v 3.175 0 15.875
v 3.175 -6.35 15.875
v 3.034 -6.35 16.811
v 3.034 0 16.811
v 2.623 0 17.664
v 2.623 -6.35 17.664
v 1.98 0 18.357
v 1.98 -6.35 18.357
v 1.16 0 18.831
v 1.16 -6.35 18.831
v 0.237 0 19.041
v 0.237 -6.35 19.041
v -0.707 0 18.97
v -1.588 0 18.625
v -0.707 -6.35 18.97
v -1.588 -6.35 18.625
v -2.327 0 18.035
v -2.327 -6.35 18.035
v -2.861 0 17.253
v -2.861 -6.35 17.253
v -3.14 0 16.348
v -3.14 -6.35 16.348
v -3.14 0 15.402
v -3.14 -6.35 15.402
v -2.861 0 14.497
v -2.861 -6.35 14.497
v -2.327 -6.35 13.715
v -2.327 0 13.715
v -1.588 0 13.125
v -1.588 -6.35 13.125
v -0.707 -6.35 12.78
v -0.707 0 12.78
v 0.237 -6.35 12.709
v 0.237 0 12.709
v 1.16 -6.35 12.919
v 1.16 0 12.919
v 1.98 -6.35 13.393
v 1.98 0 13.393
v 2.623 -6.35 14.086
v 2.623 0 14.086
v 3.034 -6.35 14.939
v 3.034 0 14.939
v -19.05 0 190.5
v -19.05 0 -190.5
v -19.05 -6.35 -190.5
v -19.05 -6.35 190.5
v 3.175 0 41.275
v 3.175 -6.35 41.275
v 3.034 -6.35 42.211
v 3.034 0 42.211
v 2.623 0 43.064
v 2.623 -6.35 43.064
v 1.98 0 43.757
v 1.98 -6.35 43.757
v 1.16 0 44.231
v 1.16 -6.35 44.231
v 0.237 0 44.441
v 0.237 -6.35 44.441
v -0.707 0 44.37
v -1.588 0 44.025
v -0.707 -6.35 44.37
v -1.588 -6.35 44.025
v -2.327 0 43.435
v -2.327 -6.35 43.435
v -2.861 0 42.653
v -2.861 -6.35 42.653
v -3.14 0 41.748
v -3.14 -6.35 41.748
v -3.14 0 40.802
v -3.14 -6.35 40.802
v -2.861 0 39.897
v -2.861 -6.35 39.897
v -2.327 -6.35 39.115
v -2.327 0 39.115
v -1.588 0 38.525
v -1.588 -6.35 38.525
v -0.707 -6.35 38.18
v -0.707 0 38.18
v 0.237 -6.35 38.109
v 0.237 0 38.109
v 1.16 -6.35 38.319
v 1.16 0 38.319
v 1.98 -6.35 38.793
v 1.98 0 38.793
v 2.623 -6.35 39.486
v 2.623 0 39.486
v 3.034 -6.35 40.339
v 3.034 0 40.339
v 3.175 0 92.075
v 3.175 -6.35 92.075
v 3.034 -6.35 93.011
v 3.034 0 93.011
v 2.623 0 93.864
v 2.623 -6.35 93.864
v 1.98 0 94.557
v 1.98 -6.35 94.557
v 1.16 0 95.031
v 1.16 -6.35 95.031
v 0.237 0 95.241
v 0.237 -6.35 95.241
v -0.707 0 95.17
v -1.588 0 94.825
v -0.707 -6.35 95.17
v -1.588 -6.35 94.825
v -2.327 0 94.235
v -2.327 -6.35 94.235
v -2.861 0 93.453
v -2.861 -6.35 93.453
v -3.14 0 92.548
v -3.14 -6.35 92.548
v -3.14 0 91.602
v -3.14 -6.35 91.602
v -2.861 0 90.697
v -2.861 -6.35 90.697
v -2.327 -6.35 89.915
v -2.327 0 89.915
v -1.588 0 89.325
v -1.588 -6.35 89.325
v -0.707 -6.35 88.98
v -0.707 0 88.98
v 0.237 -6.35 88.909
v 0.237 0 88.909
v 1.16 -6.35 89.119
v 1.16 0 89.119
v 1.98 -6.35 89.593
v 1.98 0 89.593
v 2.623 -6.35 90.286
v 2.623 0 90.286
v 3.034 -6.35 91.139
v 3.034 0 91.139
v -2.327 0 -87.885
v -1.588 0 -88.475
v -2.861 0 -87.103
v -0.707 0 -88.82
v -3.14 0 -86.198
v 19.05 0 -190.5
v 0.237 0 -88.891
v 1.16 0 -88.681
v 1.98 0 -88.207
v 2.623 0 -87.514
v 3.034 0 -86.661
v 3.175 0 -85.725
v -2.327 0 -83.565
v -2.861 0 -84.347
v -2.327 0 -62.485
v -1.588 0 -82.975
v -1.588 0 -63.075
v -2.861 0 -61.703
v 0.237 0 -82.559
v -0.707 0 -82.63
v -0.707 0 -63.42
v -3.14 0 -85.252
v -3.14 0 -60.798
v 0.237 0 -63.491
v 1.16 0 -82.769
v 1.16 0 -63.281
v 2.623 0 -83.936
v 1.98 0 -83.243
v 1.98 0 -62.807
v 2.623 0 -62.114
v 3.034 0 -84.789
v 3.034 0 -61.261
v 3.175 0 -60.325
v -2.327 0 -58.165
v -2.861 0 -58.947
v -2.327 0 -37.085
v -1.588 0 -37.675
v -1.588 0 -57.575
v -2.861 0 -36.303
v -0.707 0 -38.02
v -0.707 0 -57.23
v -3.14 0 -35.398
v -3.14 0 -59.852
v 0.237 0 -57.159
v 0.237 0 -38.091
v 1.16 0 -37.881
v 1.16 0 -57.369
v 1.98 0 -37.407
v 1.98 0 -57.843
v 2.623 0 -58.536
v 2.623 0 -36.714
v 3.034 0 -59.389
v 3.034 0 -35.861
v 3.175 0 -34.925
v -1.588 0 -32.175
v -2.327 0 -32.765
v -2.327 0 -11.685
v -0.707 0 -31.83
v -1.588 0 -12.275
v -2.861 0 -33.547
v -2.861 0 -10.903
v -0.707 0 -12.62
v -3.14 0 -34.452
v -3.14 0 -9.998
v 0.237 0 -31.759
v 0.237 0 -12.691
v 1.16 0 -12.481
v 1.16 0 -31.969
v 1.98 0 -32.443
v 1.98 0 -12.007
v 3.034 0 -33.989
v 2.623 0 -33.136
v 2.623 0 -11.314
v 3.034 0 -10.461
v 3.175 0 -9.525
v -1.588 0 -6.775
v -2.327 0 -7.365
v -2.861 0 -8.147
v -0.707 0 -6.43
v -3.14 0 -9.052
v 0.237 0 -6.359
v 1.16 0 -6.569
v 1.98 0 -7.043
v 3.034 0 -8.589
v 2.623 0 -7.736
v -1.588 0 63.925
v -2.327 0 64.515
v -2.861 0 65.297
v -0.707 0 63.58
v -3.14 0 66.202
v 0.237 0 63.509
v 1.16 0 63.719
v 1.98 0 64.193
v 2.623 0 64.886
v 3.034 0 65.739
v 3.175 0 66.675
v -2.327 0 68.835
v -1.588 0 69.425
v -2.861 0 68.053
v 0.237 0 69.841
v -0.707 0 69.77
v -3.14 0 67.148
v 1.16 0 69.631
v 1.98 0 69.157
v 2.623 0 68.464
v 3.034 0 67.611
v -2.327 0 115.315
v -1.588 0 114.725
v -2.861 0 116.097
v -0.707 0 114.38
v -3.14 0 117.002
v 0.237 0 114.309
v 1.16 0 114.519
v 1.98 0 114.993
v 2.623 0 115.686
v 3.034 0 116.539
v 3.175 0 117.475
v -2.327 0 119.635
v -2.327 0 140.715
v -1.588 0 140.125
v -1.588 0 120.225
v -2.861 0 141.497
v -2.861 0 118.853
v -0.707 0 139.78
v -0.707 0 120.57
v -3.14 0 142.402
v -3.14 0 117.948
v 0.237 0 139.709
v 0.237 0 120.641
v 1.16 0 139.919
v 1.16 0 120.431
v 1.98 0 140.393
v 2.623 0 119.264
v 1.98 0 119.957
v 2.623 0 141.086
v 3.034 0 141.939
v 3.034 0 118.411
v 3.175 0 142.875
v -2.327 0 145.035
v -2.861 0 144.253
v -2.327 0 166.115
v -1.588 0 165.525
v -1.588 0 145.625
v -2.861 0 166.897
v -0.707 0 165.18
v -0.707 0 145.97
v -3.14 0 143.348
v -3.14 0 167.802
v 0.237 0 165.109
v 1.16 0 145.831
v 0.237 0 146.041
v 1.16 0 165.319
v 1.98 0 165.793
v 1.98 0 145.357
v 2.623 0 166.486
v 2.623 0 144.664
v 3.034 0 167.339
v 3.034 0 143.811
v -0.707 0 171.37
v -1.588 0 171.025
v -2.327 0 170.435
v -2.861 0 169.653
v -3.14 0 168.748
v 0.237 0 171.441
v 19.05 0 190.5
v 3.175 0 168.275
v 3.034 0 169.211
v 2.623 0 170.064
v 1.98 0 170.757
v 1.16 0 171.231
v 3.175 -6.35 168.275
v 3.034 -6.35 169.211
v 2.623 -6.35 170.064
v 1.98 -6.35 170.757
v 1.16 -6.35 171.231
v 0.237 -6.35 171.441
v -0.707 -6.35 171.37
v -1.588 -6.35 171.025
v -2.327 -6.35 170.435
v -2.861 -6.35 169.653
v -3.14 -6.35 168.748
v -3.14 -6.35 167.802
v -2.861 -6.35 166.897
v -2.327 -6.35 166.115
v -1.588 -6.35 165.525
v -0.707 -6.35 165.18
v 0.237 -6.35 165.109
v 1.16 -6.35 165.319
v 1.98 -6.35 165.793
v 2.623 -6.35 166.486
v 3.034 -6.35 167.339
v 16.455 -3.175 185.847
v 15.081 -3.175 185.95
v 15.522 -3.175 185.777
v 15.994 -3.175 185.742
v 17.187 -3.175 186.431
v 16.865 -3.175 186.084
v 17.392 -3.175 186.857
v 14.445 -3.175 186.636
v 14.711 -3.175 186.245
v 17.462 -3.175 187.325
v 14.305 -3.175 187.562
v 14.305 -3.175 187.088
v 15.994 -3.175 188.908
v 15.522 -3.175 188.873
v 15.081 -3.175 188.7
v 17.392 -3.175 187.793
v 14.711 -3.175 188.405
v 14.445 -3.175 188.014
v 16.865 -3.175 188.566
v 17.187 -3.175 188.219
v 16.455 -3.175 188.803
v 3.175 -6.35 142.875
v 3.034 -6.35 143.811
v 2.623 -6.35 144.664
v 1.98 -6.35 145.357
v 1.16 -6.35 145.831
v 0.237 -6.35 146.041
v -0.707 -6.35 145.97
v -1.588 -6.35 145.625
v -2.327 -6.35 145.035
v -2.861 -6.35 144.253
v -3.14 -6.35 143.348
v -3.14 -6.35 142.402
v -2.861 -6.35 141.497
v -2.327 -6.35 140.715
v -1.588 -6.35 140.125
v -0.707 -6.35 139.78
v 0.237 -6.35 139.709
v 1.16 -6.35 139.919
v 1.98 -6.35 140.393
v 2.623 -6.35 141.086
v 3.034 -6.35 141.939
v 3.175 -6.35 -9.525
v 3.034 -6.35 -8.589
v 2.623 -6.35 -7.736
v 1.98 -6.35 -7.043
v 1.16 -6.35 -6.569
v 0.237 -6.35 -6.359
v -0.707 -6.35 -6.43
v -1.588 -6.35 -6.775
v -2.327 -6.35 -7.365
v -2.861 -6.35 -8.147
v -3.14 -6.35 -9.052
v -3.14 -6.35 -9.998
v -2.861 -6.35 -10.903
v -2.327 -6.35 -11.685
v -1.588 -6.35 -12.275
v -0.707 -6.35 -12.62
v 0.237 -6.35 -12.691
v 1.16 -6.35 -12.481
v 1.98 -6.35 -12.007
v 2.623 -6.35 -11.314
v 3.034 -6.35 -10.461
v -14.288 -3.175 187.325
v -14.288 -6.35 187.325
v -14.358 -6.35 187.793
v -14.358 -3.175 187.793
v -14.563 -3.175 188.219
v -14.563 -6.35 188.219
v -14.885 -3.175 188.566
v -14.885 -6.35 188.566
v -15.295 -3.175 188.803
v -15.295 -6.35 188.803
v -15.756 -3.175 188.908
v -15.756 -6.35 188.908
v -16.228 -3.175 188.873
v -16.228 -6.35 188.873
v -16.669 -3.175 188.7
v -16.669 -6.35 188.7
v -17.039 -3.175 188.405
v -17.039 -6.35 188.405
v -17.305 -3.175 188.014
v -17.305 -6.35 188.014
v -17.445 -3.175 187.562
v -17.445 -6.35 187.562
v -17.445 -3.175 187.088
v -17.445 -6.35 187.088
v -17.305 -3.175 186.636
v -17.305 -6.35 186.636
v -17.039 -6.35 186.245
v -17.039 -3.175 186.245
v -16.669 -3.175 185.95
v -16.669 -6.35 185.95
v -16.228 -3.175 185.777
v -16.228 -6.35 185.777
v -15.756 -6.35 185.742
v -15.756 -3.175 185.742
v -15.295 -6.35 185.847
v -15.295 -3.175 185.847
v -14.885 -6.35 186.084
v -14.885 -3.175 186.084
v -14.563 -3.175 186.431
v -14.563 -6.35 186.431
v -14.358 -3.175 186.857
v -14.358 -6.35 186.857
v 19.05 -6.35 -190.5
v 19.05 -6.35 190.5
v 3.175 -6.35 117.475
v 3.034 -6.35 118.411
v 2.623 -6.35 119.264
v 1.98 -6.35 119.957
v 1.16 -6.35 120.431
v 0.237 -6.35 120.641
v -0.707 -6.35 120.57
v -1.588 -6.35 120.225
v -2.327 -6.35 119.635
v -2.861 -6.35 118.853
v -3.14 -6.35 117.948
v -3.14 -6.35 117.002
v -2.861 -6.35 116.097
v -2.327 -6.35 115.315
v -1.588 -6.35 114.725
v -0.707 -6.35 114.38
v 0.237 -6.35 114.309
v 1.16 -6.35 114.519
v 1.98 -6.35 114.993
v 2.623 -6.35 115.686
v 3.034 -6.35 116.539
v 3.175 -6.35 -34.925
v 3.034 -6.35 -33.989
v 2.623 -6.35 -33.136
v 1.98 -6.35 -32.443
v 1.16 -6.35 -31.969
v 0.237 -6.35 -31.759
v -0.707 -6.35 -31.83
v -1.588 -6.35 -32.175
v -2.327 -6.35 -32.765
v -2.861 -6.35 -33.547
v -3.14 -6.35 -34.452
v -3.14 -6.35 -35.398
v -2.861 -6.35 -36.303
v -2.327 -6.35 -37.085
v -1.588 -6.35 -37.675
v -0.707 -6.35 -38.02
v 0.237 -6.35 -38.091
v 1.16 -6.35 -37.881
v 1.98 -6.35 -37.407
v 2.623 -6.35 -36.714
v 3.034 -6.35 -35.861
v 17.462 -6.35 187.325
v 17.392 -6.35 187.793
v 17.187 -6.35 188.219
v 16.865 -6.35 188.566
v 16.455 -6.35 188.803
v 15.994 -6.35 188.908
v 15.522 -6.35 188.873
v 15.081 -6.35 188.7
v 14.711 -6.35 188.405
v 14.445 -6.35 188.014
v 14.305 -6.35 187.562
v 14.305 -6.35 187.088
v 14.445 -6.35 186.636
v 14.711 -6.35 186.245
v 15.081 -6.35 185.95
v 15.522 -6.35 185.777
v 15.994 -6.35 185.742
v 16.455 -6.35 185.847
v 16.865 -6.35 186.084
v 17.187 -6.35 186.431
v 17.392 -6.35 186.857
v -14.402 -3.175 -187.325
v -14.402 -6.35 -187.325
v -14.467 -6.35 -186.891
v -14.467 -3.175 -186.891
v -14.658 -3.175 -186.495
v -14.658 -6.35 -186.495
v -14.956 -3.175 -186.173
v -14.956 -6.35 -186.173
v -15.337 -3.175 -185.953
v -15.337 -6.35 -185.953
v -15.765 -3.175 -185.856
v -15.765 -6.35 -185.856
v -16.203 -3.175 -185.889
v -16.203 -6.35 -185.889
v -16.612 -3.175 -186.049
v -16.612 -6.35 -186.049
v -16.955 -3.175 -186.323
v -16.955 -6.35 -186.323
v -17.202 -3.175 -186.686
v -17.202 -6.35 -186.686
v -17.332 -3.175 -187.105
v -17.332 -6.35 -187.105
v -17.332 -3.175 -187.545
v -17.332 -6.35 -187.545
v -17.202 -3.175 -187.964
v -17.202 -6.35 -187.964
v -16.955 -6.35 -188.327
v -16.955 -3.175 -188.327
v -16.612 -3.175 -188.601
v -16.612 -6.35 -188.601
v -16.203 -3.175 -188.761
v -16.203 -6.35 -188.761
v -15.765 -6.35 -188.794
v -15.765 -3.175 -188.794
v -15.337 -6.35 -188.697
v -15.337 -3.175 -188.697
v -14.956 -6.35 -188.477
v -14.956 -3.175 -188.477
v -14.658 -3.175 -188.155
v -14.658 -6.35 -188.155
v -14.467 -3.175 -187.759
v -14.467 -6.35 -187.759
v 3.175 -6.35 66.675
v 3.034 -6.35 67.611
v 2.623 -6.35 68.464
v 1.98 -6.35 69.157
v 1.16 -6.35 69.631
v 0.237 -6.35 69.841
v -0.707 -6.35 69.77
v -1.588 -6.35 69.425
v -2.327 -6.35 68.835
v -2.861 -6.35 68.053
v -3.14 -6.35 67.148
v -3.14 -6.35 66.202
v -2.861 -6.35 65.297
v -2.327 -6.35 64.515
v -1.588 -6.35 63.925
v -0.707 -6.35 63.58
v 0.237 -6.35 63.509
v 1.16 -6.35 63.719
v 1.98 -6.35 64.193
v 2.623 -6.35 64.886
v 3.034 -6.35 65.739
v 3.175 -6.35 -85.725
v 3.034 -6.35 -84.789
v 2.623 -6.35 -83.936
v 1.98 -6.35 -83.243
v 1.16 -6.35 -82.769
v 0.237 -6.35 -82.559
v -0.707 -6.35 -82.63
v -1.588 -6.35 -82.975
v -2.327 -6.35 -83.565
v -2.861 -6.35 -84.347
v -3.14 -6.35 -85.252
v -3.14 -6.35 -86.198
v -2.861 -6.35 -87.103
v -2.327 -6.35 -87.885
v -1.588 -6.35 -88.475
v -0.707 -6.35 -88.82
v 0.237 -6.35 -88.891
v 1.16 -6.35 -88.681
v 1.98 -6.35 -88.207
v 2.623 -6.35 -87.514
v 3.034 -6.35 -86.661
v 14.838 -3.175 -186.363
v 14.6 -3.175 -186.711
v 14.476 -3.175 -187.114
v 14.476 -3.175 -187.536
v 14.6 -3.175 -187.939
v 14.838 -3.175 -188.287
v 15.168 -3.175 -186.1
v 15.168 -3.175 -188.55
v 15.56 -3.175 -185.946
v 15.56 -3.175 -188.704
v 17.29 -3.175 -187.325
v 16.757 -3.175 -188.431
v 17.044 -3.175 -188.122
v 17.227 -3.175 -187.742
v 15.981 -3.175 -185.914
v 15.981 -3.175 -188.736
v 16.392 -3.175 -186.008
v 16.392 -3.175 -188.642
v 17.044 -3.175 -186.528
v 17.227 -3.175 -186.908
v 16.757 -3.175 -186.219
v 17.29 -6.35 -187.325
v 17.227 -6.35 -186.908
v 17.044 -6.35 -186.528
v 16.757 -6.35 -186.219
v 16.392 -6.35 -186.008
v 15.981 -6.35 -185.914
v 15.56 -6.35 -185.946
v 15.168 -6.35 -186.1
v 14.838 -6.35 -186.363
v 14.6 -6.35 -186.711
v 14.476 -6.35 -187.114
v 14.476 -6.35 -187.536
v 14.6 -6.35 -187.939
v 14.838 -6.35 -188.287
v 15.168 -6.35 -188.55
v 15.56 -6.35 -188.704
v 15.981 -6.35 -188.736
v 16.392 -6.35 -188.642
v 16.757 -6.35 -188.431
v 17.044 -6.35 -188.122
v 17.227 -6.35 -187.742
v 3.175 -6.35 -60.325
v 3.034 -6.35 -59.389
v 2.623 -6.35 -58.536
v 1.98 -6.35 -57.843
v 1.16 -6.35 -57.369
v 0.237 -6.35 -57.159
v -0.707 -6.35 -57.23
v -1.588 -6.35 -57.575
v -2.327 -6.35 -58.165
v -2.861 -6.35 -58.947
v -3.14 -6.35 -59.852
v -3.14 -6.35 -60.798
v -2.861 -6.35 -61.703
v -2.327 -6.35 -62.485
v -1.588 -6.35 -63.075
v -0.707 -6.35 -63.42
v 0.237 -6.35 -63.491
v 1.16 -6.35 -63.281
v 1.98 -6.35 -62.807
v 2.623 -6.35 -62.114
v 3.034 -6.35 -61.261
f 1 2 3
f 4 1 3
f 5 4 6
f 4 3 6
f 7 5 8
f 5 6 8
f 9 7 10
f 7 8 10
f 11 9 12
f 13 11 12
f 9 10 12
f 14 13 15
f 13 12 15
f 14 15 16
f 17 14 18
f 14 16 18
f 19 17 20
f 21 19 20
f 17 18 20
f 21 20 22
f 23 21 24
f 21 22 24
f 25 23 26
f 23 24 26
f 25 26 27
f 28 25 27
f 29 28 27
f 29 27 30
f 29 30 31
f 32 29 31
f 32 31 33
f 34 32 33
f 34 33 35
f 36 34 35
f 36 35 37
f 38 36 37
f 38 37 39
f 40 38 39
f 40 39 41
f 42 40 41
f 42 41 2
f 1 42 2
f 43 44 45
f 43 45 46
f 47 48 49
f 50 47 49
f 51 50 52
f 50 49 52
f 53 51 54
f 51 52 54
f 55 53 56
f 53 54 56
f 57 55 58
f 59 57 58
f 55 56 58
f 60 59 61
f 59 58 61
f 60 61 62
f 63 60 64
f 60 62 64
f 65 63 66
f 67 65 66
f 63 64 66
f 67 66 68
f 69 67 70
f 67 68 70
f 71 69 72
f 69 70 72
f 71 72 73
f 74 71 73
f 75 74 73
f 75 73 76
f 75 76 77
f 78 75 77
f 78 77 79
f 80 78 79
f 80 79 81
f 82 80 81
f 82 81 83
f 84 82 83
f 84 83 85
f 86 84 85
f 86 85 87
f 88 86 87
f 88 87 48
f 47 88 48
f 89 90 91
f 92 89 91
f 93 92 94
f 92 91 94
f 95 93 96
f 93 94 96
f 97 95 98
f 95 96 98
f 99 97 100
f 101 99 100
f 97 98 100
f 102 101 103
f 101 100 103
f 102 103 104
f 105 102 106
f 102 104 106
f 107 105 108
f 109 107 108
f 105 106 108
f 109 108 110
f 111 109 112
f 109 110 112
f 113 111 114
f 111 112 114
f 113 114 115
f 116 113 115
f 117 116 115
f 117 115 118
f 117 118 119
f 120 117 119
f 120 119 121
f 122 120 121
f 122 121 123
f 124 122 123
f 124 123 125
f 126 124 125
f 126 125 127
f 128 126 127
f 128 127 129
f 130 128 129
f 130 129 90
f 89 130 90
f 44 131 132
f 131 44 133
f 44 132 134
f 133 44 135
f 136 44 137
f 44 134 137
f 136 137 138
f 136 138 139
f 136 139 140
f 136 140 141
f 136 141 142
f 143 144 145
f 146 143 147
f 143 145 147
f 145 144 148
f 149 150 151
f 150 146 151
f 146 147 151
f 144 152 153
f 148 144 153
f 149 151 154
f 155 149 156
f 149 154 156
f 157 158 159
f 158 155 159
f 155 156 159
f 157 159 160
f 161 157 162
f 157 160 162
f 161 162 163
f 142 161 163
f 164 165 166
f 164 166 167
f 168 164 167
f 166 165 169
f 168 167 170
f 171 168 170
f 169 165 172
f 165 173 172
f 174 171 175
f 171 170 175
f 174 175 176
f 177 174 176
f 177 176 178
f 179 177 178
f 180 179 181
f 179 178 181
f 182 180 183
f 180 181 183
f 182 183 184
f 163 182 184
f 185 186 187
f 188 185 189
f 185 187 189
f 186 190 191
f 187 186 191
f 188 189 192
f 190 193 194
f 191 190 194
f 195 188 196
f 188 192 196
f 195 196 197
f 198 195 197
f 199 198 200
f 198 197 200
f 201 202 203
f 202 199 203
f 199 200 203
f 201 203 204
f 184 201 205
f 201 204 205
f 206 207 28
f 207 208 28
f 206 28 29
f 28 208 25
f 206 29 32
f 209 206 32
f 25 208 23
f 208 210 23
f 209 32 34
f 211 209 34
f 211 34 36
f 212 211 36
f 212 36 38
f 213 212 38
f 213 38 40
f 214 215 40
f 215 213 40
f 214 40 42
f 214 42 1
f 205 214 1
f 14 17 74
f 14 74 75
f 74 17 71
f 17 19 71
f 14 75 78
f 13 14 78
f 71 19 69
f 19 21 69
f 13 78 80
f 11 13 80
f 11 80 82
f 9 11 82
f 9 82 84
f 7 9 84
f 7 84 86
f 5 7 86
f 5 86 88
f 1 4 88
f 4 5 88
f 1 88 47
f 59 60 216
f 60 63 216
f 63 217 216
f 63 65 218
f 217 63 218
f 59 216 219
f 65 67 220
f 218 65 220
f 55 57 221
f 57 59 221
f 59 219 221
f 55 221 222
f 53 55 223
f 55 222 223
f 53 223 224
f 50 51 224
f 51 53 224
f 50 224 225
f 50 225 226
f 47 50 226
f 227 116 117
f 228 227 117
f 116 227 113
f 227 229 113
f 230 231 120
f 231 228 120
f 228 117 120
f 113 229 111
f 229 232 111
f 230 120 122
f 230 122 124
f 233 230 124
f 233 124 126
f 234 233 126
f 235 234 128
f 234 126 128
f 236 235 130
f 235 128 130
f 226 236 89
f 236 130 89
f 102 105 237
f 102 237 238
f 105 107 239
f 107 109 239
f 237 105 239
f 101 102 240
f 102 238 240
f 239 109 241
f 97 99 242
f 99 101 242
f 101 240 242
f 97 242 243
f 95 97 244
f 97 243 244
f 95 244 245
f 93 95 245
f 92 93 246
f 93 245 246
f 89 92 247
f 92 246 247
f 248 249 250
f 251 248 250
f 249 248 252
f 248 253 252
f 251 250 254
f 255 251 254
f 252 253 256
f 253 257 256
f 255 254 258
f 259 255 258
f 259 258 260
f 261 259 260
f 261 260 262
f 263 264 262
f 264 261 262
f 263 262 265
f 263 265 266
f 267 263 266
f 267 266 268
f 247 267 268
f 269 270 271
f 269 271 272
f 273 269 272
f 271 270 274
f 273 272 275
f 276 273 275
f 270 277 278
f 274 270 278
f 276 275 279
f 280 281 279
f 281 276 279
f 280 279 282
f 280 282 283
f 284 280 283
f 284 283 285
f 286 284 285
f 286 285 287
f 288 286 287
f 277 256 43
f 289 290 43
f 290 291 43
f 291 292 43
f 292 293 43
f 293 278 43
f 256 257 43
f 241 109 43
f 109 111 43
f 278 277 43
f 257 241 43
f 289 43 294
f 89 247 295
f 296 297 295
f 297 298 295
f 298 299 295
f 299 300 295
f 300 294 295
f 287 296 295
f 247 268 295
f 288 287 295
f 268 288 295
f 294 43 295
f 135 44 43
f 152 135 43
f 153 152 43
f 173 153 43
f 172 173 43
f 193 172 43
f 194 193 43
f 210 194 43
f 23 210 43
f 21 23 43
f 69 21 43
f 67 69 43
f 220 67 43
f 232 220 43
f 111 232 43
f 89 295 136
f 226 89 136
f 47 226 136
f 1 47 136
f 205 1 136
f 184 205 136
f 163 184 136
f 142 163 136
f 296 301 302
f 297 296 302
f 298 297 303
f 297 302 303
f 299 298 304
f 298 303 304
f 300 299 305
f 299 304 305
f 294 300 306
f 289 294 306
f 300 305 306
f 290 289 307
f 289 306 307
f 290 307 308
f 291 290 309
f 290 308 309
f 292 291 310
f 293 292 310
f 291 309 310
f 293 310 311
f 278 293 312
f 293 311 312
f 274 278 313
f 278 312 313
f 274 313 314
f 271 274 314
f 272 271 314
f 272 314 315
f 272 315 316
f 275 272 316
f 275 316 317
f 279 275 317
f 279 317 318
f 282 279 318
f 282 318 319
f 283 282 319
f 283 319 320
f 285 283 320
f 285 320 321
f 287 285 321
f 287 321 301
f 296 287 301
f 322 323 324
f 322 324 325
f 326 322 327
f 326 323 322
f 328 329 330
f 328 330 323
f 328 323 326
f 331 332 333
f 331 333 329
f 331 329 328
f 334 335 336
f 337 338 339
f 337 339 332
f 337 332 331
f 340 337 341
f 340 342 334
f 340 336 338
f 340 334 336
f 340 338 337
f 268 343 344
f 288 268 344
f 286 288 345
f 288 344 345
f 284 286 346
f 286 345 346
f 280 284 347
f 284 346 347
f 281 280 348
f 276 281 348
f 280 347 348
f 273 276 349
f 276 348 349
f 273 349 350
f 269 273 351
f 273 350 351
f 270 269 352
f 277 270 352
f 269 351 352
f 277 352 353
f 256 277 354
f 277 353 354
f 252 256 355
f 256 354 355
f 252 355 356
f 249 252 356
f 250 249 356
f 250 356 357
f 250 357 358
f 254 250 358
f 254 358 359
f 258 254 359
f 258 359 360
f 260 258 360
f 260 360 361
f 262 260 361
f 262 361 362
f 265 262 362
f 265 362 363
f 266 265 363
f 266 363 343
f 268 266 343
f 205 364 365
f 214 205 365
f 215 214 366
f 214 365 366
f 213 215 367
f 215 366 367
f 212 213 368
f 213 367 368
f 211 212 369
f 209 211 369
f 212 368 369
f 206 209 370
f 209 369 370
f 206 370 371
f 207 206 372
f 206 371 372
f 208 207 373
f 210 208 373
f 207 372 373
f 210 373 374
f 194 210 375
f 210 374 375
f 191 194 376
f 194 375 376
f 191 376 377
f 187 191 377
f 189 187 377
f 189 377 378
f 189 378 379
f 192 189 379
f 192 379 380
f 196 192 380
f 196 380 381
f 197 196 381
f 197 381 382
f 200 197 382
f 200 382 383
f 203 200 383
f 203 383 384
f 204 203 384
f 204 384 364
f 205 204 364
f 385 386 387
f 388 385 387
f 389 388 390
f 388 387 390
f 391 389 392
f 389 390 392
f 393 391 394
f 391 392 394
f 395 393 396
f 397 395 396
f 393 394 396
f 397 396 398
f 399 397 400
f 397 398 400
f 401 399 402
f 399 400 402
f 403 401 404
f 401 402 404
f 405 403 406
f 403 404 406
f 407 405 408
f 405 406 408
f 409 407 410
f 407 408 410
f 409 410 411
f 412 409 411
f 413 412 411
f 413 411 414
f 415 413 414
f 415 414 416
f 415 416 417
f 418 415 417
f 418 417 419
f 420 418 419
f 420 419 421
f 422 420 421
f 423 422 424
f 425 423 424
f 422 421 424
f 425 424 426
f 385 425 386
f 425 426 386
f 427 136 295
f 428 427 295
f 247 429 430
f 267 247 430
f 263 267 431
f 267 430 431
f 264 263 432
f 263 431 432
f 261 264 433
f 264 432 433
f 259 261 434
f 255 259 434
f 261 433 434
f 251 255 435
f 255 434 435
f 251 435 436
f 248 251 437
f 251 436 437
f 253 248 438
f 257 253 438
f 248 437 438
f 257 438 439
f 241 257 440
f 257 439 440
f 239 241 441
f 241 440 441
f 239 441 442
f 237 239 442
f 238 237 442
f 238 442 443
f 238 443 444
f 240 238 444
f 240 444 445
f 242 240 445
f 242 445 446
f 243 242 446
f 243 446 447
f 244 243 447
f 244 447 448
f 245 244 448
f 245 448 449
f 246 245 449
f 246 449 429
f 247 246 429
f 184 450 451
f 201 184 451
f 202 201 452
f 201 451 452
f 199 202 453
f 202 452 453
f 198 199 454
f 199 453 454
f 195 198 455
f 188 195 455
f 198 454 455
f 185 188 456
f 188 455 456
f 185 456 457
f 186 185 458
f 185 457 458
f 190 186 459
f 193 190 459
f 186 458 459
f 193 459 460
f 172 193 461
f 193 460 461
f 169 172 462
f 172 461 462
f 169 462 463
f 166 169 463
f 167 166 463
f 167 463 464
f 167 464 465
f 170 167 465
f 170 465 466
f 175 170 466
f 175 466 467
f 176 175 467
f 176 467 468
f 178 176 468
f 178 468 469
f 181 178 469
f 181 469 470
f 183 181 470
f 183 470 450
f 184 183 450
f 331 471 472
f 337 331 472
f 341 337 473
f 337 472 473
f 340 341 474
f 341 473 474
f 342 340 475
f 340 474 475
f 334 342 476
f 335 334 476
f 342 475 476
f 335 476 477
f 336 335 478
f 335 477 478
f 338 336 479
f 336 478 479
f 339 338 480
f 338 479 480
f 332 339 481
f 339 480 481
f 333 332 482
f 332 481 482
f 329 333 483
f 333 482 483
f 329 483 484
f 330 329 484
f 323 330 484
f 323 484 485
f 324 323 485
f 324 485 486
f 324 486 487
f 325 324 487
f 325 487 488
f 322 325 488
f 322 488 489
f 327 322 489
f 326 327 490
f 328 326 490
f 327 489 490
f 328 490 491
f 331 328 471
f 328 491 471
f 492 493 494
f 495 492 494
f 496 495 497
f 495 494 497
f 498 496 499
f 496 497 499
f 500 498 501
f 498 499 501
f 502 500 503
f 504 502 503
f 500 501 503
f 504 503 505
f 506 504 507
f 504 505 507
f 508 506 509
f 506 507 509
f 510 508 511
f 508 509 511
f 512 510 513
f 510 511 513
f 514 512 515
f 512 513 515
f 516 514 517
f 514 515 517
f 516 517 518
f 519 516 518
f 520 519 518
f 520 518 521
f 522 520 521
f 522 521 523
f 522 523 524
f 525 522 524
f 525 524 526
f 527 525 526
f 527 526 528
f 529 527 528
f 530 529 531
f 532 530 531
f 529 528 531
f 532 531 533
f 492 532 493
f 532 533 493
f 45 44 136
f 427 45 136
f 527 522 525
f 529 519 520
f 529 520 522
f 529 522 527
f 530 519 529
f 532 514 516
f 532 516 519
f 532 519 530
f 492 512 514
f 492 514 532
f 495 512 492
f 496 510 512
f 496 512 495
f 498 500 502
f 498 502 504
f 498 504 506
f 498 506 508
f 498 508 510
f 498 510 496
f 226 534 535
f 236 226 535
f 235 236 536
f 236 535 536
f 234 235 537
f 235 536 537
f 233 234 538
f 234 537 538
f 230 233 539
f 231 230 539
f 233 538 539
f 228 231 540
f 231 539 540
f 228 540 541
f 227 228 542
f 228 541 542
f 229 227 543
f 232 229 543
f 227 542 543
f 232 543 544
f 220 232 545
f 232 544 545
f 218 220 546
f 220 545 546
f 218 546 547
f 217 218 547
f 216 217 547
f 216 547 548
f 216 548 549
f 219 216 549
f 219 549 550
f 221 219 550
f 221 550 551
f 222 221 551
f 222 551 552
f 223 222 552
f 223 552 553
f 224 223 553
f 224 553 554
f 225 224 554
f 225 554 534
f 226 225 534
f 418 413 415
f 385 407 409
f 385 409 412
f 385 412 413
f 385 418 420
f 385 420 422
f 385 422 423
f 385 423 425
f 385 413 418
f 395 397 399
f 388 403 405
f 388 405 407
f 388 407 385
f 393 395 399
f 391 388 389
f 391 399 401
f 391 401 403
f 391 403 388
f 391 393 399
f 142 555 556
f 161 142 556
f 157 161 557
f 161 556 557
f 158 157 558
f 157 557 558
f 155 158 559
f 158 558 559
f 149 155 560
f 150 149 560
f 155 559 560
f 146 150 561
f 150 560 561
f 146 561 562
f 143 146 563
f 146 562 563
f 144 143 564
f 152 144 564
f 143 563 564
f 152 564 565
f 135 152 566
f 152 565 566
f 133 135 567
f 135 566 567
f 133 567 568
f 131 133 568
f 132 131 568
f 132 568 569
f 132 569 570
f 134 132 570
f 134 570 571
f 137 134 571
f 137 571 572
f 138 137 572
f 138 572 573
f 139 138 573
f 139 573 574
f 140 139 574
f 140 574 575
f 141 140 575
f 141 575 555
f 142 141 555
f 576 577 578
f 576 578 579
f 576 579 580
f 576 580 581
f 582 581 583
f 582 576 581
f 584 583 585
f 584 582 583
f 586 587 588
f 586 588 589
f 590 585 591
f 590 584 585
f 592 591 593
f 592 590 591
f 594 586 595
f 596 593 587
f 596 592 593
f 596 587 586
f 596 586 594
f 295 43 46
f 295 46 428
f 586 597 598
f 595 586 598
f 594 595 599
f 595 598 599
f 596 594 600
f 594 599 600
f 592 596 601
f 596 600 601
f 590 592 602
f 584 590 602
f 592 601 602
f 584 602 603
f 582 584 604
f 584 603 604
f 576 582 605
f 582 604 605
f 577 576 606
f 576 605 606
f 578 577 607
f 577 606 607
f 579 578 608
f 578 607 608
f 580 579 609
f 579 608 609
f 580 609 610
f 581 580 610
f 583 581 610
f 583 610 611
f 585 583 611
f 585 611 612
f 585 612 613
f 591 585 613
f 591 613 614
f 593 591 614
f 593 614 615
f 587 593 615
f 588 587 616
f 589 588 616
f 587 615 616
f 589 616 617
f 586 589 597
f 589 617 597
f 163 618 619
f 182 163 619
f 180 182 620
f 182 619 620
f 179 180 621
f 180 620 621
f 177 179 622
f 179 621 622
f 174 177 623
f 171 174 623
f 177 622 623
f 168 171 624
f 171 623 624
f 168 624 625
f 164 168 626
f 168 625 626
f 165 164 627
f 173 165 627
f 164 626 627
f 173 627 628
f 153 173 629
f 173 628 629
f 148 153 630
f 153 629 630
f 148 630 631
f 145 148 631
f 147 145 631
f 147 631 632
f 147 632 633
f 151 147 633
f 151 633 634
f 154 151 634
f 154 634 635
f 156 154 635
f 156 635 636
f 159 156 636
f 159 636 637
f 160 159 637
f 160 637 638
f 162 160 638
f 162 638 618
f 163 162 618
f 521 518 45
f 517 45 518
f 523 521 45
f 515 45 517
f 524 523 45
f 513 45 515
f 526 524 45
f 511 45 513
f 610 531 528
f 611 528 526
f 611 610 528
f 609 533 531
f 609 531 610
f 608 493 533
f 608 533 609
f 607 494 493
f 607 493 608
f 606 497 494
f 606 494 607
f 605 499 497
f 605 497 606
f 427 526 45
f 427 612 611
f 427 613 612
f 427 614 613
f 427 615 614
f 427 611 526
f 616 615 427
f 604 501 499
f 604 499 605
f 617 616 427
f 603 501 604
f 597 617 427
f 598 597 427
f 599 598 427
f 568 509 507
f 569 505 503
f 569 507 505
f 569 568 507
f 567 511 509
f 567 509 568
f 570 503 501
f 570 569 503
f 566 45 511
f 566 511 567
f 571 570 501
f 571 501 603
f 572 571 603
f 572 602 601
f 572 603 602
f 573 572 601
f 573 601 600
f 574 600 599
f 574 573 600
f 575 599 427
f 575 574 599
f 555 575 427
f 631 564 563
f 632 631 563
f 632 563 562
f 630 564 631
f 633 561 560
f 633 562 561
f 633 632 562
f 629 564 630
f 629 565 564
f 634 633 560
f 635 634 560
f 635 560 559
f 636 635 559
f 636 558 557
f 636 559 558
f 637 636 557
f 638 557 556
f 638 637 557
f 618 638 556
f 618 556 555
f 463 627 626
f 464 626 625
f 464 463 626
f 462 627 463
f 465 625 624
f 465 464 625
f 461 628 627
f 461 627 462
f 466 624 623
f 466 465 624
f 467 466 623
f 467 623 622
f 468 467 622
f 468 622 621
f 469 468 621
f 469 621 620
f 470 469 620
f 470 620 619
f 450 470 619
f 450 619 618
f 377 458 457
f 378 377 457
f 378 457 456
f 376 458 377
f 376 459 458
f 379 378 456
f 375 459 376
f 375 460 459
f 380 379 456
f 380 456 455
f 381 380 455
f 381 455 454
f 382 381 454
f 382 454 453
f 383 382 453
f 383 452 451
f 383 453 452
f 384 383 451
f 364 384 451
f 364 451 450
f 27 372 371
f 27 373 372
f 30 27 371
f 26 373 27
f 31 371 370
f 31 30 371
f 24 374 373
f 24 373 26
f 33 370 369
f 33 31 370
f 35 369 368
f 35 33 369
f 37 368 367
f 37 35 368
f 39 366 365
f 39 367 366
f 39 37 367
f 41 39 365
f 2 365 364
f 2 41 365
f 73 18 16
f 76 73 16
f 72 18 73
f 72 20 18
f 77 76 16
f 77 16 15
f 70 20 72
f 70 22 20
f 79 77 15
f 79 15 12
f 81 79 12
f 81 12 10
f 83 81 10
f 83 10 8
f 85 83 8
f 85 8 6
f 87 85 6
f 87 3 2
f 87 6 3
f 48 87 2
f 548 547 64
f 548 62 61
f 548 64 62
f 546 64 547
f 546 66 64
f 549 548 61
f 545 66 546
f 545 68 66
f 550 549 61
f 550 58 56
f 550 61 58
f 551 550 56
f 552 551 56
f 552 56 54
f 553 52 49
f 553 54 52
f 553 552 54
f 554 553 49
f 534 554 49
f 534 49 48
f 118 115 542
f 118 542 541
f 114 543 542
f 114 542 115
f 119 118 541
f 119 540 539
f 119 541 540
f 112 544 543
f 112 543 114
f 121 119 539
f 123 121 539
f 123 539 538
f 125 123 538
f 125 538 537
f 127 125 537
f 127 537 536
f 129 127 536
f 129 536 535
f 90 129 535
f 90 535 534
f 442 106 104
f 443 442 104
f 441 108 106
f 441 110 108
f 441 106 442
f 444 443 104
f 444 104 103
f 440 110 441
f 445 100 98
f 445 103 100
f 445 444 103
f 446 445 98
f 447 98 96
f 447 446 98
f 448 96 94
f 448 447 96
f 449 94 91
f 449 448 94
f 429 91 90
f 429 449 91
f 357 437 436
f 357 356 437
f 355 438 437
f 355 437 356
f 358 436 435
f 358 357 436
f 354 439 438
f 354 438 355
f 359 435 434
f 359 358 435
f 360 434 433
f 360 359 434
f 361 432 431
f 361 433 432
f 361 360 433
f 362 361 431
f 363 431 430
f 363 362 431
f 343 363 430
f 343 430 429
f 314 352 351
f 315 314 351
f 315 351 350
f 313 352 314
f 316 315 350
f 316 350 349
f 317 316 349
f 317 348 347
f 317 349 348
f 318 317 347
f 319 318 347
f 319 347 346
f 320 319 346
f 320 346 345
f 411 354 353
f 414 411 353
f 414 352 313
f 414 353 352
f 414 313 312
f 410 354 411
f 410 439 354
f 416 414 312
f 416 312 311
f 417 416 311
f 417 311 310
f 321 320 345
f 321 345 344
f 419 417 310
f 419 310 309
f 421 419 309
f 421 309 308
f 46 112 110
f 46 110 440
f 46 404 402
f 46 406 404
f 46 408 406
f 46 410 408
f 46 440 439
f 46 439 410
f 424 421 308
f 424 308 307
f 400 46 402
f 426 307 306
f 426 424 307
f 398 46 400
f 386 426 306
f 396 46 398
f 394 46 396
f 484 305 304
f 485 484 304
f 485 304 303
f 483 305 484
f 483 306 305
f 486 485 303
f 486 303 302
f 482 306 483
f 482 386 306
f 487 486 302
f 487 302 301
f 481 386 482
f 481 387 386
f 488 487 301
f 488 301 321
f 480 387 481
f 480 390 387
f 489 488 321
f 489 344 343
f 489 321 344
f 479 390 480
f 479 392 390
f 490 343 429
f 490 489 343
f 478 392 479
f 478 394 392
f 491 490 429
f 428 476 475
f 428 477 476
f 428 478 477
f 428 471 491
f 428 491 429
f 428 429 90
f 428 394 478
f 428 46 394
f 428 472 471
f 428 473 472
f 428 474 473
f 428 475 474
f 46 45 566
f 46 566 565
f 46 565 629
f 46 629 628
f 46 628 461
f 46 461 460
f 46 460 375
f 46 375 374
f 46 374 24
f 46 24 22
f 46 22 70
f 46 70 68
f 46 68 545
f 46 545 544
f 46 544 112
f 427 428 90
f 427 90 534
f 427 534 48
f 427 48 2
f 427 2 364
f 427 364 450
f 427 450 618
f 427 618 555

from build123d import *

# Parameters (mm, degrees)
F0_W     = 38.1
F0_H     = 381
F1_DEPTH = 6.35
F2_R     = 3.175
F3_DEPTH = 6.351
F4_R     = 1.5875
F5_DEPTH = 3.175
F6_R     = 1.473365
F6_R_2   = 1.414723
F7_DEPTH = 3.175


with BuildPart() as f1:
    # F0 (on Front) → F1 (new body)
    with BuildSketch(Plane.XZ):
        Rectangle(F0_W, F0_H)
    extrude(amount=F1_DEPTH)

    # F2 (on face) → F3 (cut, through all)
    with BuildSketch(Plane.XZ.offset(6.35)):
        with Locations((0, -85.725)):
            Circle(F2_R)
        with Locations((0, -60.325)):
            Circle(F2_R)
        with Locations((0, -34.925)):
            Circle(F2_R)
        with Locations((0, -9.525)):
            Circle(F2_R)
        with Locations((0, 15.875)):
            Circle(F2_R)
        with Locations((0, 41.275)):
            Circle(F2_R)
        with Locations((0, 66.675)):
            Circle(F2_R)
        with Locations((0, 92.075)):
            Circle(F2_R)
        with Locations((0, 117.475)):
            Circle(F2_R)
        with Locations((0, 142.875)):
            Circle(F2_R)
        with Locations((0, 168.275)):
            Circle(F2_R)
    extrude(amount=-F3_DEPTH, mode=Mode.SUBTRACT)

    # F4 (on face) → F5 (cut)
    with BuildSketch(Plane.XZ.offset(6.35)):
        with Locations((-15.875, 187.325)):
            Circle(F4_R)
        with Locations((15.875, 187.325)):
            Circle(F4_R)
    extrude(amount=-F5_DEPTH, mode=Mode.SUBTRACT)

    # F6 (on face) → F7 (cut)
    with BuildSketch(Plane.XZ.offset(6.35)):
        with Locations((-15.875, -187.325)):
            Circle(F6_R)
        with Locations((15.875, -187.325)):
            Circle(F6_R_2)
    extrude(amount=-F7_DEPTH, mode=Mode.SUBTRACT)


solid = f1.part
